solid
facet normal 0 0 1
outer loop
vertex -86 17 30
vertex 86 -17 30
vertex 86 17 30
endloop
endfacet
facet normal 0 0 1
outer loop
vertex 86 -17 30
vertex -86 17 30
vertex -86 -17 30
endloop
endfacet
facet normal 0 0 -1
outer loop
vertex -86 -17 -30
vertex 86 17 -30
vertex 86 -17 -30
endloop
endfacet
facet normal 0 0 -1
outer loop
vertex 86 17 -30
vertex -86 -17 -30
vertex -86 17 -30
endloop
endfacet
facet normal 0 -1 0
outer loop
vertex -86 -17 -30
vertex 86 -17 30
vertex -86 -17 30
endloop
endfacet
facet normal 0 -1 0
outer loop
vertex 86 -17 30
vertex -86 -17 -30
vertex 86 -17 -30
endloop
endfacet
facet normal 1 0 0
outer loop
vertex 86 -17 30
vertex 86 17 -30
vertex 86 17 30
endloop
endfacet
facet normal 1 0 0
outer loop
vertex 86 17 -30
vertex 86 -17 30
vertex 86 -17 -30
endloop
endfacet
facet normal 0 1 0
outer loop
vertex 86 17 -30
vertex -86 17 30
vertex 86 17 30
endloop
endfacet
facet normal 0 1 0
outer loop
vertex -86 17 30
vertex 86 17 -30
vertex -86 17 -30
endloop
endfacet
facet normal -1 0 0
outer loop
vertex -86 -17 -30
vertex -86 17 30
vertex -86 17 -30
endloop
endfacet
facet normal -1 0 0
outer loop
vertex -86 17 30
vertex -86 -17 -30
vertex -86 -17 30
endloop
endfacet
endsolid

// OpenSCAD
module bigBattery()
{
	color([0.1, 0.1, 0.1])
	{
		cube([172, 34, 60], center=true);
	}
}

bigBattery();
